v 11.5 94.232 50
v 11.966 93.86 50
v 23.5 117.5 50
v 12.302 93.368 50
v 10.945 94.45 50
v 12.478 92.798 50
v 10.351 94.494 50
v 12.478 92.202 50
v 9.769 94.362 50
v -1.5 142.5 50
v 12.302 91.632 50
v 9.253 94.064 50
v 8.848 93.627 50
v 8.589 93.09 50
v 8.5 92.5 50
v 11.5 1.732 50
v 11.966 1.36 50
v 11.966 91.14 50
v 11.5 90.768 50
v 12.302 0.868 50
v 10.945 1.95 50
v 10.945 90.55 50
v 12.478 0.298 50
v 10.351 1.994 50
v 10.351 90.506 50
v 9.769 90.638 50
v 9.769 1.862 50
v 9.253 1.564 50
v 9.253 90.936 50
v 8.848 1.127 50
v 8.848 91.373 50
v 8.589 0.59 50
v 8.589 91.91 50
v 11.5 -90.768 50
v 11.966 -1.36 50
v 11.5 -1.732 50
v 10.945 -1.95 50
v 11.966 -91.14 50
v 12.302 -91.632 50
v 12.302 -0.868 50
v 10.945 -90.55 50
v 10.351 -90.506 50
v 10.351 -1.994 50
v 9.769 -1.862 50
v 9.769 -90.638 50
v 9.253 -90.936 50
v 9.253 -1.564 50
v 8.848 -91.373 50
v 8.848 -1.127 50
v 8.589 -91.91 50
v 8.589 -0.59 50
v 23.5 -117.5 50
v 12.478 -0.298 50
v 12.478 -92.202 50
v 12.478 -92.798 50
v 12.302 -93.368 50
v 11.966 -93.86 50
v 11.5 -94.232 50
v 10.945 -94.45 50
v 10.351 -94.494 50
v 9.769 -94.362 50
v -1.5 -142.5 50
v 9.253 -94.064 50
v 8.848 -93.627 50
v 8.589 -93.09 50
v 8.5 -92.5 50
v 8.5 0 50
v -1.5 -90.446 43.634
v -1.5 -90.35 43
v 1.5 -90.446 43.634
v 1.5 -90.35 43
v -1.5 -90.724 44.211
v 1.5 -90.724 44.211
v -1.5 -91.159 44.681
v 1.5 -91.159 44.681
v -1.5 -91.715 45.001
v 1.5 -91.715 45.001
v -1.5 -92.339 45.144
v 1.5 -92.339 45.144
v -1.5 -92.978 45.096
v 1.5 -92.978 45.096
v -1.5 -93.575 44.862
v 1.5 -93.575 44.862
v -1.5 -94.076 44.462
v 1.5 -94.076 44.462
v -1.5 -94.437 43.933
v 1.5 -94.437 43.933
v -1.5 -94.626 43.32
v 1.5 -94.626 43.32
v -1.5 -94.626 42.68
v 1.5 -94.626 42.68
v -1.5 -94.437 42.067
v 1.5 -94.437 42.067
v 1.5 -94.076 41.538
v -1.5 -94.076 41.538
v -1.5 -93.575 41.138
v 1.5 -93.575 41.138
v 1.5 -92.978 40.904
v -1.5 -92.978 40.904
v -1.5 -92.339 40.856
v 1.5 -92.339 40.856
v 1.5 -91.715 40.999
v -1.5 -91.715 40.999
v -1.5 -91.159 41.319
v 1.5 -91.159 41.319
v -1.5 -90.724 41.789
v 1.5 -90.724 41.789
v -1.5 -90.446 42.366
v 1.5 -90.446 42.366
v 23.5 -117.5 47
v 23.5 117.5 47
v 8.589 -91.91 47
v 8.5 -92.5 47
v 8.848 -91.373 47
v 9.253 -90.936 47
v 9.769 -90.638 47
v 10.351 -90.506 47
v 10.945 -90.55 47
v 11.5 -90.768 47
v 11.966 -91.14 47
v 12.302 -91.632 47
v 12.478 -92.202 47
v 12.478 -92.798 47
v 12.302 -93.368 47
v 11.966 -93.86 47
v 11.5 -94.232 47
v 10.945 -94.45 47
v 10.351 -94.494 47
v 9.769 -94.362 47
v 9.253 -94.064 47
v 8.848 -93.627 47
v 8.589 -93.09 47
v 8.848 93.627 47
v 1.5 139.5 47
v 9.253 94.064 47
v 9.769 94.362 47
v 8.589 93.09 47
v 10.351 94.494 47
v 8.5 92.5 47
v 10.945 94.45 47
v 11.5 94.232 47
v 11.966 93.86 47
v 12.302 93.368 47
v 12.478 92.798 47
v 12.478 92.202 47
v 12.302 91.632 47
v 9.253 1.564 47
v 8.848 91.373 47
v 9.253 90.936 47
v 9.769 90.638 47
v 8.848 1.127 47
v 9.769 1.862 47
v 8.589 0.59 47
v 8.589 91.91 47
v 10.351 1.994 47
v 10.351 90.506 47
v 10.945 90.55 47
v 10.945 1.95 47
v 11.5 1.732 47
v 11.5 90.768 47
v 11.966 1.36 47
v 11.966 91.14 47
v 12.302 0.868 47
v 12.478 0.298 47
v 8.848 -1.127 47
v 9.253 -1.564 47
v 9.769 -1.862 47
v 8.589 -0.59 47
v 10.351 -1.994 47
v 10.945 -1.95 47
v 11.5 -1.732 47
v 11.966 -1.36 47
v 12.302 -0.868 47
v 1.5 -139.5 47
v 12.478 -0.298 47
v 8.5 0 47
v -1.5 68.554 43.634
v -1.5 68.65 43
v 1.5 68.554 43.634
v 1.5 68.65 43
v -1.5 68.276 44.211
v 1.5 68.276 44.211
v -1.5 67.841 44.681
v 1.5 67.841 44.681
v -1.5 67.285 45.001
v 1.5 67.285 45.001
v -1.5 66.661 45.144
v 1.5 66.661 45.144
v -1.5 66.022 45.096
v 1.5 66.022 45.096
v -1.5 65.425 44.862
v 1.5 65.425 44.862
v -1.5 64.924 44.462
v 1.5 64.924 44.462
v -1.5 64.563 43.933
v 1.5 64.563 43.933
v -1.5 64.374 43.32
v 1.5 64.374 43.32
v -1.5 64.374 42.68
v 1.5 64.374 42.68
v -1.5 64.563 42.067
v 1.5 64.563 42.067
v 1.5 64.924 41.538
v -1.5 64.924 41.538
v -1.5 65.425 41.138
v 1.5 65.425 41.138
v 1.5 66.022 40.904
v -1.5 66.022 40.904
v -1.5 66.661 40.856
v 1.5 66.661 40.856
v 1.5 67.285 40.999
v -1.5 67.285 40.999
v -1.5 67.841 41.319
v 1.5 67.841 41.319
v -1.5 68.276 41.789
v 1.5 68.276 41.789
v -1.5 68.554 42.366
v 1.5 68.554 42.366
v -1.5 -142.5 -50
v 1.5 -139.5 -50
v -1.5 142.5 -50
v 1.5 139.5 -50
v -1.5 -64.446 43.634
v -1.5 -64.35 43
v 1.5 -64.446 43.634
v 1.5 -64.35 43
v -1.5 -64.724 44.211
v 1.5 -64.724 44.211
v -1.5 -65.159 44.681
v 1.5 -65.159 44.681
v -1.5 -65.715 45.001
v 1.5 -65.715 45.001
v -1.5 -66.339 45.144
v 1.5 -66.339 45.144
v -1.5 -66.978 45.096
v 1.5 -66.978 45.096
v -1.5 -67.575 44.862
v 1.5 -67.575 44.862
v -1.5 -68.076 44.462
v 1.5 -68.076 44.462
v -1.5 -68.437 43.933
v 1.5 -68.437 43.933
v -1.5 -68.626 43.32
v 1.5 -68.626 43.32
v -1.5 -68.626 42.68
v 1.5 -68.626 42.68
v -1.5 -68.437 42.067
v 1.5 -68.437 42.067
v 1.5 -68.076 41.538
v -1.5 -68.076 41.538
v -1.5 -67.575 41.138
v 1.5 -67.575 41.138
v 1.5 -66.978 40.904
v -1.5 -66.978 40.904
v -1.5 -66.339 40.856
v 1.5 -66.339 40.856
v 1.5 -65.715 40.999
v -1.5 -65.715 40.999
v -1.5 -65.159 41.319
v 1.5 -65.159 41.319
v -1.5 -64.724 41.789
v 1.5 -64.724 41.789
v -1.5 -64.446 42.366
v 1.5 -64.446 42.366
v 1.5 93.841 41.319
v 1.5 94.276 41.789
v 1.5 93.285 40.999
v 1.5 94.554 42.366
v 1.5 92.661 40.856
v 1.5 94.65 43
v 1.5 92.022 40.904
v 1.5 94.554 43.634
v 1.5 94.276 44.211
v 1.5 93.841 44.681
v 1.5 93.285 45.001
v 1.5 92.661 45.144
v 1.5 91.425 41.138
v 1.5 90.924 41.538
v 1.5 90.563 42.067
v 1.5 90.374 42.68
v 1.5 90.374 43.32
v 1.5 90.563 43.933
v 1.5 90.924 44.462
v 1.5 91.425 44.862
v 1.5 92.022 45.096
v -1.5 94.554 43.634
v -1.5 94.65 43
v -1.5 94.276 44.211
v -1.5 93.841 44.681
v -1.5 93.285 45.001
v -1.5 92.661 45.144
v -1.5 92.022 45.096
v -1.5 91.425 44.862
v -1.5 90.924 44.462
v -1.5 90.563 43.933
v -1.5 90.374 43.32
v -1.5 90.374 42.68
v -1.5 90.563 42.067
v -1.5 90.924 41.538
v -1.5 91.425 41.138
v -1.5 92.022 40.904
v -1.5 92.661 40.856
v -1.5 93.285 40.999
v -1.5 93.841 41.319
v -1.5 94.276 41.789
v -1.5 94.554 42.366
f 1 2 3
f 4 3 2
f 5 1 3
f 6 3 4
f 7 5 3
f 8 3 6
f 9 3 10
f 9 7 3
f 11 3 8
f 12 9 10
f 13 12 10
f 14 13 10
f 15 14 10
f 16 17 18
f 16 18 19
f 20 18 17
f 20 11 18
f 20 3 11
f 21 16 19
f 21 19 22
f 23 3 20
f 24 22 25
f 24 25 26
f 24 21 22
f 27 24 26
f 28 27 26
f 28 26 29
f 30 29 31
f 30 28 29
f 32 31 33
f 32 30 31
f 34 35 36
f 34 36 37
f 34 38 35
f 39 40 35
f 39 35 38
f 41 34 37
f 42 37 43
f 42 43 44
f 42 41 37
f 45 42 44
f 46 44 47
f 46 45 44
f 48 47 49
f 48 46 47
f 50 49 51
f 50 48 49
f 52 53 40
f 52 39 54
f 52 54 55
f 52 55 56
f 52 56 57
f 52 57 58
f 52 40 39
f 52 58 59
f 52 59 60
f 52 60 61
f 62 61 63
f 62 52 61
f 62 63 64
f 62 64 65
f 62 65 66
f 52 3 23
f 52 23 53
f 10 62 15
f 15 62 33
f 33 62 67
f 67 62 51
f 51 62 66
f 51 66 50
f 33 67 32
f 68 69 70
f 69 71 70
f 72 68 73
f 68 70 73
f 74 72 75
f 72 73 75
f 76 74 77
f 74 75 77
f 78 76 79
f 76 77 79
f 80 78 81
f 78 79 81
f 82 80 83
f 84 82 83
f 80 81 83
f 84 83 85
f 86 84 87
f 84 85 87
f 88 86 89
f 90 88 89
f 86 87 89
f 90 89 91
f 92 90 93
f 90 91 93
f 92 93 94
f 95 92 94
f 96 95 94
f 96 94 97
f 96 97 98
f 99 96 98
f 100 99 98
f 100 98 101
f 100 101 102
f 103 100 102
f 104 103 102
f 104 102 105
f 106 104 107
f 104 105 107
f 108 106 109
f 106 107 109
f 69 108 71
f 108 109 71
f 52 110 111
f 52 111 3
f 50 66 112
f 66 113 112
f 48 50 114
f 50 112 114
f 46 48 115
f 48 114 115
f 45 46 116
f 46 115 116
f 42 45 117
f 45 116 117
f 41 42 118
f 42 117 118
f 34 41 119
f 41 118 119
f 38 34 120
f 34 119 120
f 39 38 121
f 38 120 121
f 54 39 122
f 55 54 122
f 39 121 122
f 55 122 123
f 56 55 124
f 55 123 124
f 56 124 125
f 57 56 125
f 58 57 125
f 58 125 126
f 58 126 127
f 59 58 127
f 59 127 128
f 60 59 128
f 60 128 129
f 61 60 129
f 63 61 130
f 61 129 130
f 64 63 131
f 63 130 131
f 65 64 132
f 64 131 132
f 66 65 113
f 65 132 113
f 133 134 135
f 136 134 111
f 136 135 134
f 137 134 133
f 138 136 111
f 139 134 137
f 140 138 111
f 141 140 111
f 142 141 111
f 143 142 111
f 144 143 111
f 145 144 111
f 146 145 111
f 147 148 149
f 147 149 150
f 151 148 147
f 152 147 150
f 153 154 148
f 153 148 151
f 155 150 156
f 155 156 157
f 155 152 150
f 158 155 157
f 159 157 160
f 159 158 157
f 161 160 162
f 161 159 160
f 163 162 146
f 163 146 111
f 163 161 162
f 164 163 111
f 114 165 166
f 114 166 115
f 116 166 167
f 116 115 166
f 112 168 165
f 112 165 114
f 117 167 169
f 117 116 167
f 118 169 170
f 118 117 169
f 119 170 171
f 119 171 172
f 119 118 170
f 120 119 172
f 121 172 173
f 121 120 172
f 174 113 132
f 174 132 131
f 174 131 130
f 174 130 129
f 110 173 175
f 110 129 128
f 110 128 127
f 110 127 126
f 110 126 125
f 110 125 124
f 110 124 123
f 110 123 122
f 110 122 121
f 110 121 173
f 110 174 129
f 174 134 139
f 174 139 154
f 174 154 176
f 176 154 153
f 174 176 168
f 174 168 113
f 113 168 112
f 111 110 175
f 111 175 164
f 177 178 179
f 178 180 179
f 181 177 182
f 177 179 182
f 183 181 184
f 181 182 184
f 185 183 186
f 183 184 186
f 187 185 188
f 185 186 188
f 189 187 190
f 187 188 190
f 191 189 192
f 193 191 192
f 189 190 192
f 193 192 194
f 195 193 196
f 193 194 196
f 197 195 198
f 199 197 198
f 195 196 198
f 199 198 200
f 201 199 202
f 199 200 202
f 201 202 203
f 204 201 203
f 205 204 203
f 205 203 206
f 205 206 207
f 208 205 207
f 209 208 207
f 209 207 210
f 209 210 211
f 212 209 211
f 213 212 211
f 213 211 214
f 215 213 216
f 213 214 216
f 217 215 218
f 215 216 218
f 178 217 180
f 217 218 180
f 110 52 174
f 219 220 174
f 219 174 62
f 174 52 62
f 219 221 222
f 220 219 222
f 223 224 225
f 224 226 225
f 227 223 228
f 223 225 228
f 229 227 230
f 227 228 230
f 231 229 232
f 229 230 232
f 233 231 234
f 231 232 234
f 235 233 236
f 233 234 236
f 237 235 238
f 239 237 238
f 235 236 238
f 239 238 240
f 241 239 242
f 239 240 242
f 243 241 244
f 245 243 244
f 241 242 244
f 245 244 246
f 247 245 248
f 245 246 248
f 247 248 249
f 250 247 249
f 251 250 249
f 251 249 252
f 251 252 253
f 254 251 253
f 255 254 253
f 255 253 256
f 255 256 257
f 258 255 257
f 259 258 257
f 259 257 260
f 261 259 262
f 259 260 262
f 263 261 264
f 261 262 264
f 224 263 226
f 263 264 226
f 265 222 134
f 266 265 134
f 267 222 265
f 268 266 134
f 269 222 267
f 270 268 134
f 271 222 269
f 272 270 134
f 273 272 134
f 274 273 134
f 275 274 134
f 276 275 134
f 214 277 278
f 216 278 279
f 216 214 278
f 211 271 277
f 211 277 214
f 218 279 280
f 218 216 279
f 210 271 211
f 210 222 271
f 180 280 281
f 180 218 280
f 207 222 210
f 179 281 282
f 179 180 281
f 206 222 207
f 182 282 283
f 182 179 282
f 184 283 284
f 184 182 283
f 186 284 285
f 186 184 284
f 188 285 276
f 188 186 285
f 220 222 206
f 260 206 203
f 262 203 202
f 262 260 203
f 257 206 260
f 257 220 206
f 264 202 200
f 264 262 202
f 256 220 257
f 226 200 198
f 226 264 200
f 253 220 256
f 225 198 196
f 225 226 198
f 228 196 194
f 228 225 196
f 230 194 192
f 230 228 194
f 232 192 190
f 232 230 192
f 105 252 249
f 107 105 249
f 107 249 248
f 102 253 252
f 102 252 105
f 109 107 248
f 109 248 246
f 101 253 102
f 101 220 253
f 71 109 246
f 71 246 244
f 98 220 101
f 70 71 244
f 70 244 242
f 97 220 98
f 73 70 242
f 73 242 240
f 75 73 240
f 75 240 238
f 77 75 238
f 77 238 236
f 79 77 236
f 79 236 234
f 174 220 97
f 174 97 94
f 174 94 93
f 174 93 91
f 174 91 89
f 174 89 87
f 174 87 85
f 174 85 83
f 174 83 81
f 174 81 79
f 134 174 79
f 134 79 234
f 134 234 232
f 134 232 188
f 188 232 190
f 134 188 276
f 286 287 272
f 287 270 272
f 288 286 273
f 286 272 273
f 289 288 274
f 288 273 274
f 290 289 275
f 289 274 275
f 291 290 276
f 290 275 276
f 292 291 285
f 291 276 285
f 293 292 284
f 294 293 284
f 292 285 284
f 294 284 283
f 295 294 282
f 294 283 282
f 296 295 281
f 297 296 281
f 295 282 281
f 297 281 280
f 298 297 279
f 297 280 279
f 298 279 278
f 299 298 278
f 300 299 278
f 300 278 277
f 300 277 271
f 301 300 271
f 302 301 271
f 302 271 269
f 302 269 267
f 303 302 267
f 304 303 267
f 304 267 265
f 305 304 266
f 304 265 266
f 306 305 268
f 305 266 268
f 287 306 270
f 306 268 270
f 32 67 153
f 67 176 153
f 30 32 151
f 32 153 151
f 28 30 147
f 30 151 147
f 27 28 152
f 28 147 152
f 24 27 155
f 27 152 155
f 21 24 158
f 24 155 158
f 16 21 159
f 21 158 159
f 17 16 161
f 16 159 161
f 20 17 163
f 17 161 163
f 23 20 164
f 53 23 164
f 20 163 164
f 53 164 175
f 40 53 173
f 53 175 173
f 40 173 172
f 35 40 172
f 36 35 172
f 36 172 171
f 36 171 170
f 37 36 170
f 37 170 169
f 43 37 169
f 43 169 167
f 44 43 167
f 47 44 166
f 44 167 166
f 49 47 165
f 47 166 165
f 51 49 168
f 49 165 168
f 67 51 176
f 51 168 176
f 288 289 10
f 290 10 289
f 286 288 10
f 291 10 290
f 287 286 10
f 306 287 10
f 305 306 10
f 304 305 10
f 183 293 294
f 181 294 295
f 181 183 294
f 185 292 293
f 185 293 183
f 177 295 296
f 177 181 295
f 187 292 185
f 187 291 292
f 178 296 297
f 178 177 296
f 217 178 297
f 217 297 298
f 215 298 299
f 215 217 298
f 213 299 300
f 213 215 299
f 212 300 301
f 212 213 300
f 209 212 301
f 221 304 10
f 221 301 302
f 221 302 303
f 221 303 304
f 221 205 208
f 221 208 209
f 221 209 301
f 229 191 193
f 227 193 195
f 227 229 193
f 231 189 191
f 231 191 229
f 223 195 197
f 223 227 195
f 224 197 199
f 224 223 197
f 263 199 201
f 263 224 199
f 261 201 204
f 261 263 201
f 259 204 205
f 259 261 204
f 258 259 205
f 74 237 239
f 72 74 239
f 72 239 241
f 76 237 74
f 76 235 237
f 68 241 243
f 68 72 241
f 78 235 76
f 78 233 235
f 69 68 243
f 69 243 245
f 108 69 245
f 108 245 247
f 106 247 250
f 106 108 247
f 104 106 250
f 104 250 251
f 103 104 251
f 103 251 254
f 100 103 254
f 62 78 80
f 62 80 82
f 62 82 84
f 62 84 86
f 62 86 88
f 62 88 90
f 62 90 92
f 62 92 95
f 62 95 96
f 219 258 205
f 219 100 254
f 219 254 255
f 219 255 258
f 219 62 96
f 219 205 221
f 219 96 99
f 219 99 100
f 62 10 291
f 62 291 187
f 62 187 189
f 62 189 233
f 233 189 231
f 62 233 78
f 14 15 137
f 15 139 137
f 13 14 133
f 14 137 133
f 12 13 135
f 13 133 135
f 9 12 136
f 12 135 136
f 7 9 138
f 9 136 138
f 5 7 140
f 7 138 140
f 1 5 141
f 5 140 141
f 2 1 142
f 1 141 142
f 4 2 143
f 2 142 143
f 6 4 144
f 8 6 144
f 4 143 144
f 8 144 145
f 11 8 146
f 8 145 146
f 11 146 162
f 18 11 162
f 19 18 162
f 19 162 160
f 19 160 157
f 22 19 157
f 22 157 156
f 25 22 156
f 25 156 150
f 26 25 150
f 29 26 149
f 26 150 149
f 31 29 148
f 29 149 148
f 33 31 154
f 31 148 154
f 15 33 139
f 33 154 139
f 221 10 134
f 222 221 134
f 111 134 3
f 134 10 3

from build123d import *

# Parameters (mm, degrees)
F0_W     = 22
F0_H     = 3
F1_DEPTH = 142.5
F3_D     = 4.3
F3_DEPTH = 3
F3_TIP   = 1.2918503309
F5_D     = 4
F5_DEPTH = 3
F5_TIP   = 1.2017212381
F7_DEPTH = 100


with BuildPart() as f1:
    # F0 (on Front) → F1 (new body, symmetric)
    with BuildSketch(Plane.XZ):
        with Locations((12.5, 48.5)):
            Rectangle(F0_W, F0_H)
        Polygon((1.5, 47), (1.5, 50), (-1.5, 50), (-1.5, -50), (1.5, -50), align=None)
    extrude(amount=F1_DEPTH, both=True)

    # F3
    with Locations(Plane(origin=(-1.5, 0, 0), x_dir=(0, -1, 0), z_dir=(-1, 0, 0))):
        with Locations((-92.5, 43), (-66.5, 43), (66.5, 43), (92.5, 43)):
            Hole(F3_D / 2, depth=F3_DEPTH)
            with Locations((0, 0, -(F3_DEPTH + F3_TIP / 2))):  # 118° drill point
                Cone(0, F3_D / 2, F3_TIP, mode=Mode.SUBTRACT)

    # F5
    with Locations(Plane.XY.offset(50)):
        with Locations((10.5, 92.5), (10.5, 0), (10.5, -92.5)):
            Hole(F5_D / 2, depth=F5_DEPTH)
            with Locations((0, 0, -(F5_DEPTH + F5_TIP / 2))):  # 118° drill point
                Cone(0, F5_D / 2, F5_TIP, mode=Mode.SUBTRACT)

    # F6 (on face) → F7 (cut)
    with BuildSketch(Plane.XY.offset(50)):
        Polygon((23.5, 142.5), (-1.5, 142.5), (23.5, 117.5), align=None)
        Polygon((23.5, -117.5), (-1.5, -142.5), (23.5, -142.5), align=None)
    extrude(amount=-F7_DEPTH, mode=Mode.SUBTRACT)


solid = f1.part
